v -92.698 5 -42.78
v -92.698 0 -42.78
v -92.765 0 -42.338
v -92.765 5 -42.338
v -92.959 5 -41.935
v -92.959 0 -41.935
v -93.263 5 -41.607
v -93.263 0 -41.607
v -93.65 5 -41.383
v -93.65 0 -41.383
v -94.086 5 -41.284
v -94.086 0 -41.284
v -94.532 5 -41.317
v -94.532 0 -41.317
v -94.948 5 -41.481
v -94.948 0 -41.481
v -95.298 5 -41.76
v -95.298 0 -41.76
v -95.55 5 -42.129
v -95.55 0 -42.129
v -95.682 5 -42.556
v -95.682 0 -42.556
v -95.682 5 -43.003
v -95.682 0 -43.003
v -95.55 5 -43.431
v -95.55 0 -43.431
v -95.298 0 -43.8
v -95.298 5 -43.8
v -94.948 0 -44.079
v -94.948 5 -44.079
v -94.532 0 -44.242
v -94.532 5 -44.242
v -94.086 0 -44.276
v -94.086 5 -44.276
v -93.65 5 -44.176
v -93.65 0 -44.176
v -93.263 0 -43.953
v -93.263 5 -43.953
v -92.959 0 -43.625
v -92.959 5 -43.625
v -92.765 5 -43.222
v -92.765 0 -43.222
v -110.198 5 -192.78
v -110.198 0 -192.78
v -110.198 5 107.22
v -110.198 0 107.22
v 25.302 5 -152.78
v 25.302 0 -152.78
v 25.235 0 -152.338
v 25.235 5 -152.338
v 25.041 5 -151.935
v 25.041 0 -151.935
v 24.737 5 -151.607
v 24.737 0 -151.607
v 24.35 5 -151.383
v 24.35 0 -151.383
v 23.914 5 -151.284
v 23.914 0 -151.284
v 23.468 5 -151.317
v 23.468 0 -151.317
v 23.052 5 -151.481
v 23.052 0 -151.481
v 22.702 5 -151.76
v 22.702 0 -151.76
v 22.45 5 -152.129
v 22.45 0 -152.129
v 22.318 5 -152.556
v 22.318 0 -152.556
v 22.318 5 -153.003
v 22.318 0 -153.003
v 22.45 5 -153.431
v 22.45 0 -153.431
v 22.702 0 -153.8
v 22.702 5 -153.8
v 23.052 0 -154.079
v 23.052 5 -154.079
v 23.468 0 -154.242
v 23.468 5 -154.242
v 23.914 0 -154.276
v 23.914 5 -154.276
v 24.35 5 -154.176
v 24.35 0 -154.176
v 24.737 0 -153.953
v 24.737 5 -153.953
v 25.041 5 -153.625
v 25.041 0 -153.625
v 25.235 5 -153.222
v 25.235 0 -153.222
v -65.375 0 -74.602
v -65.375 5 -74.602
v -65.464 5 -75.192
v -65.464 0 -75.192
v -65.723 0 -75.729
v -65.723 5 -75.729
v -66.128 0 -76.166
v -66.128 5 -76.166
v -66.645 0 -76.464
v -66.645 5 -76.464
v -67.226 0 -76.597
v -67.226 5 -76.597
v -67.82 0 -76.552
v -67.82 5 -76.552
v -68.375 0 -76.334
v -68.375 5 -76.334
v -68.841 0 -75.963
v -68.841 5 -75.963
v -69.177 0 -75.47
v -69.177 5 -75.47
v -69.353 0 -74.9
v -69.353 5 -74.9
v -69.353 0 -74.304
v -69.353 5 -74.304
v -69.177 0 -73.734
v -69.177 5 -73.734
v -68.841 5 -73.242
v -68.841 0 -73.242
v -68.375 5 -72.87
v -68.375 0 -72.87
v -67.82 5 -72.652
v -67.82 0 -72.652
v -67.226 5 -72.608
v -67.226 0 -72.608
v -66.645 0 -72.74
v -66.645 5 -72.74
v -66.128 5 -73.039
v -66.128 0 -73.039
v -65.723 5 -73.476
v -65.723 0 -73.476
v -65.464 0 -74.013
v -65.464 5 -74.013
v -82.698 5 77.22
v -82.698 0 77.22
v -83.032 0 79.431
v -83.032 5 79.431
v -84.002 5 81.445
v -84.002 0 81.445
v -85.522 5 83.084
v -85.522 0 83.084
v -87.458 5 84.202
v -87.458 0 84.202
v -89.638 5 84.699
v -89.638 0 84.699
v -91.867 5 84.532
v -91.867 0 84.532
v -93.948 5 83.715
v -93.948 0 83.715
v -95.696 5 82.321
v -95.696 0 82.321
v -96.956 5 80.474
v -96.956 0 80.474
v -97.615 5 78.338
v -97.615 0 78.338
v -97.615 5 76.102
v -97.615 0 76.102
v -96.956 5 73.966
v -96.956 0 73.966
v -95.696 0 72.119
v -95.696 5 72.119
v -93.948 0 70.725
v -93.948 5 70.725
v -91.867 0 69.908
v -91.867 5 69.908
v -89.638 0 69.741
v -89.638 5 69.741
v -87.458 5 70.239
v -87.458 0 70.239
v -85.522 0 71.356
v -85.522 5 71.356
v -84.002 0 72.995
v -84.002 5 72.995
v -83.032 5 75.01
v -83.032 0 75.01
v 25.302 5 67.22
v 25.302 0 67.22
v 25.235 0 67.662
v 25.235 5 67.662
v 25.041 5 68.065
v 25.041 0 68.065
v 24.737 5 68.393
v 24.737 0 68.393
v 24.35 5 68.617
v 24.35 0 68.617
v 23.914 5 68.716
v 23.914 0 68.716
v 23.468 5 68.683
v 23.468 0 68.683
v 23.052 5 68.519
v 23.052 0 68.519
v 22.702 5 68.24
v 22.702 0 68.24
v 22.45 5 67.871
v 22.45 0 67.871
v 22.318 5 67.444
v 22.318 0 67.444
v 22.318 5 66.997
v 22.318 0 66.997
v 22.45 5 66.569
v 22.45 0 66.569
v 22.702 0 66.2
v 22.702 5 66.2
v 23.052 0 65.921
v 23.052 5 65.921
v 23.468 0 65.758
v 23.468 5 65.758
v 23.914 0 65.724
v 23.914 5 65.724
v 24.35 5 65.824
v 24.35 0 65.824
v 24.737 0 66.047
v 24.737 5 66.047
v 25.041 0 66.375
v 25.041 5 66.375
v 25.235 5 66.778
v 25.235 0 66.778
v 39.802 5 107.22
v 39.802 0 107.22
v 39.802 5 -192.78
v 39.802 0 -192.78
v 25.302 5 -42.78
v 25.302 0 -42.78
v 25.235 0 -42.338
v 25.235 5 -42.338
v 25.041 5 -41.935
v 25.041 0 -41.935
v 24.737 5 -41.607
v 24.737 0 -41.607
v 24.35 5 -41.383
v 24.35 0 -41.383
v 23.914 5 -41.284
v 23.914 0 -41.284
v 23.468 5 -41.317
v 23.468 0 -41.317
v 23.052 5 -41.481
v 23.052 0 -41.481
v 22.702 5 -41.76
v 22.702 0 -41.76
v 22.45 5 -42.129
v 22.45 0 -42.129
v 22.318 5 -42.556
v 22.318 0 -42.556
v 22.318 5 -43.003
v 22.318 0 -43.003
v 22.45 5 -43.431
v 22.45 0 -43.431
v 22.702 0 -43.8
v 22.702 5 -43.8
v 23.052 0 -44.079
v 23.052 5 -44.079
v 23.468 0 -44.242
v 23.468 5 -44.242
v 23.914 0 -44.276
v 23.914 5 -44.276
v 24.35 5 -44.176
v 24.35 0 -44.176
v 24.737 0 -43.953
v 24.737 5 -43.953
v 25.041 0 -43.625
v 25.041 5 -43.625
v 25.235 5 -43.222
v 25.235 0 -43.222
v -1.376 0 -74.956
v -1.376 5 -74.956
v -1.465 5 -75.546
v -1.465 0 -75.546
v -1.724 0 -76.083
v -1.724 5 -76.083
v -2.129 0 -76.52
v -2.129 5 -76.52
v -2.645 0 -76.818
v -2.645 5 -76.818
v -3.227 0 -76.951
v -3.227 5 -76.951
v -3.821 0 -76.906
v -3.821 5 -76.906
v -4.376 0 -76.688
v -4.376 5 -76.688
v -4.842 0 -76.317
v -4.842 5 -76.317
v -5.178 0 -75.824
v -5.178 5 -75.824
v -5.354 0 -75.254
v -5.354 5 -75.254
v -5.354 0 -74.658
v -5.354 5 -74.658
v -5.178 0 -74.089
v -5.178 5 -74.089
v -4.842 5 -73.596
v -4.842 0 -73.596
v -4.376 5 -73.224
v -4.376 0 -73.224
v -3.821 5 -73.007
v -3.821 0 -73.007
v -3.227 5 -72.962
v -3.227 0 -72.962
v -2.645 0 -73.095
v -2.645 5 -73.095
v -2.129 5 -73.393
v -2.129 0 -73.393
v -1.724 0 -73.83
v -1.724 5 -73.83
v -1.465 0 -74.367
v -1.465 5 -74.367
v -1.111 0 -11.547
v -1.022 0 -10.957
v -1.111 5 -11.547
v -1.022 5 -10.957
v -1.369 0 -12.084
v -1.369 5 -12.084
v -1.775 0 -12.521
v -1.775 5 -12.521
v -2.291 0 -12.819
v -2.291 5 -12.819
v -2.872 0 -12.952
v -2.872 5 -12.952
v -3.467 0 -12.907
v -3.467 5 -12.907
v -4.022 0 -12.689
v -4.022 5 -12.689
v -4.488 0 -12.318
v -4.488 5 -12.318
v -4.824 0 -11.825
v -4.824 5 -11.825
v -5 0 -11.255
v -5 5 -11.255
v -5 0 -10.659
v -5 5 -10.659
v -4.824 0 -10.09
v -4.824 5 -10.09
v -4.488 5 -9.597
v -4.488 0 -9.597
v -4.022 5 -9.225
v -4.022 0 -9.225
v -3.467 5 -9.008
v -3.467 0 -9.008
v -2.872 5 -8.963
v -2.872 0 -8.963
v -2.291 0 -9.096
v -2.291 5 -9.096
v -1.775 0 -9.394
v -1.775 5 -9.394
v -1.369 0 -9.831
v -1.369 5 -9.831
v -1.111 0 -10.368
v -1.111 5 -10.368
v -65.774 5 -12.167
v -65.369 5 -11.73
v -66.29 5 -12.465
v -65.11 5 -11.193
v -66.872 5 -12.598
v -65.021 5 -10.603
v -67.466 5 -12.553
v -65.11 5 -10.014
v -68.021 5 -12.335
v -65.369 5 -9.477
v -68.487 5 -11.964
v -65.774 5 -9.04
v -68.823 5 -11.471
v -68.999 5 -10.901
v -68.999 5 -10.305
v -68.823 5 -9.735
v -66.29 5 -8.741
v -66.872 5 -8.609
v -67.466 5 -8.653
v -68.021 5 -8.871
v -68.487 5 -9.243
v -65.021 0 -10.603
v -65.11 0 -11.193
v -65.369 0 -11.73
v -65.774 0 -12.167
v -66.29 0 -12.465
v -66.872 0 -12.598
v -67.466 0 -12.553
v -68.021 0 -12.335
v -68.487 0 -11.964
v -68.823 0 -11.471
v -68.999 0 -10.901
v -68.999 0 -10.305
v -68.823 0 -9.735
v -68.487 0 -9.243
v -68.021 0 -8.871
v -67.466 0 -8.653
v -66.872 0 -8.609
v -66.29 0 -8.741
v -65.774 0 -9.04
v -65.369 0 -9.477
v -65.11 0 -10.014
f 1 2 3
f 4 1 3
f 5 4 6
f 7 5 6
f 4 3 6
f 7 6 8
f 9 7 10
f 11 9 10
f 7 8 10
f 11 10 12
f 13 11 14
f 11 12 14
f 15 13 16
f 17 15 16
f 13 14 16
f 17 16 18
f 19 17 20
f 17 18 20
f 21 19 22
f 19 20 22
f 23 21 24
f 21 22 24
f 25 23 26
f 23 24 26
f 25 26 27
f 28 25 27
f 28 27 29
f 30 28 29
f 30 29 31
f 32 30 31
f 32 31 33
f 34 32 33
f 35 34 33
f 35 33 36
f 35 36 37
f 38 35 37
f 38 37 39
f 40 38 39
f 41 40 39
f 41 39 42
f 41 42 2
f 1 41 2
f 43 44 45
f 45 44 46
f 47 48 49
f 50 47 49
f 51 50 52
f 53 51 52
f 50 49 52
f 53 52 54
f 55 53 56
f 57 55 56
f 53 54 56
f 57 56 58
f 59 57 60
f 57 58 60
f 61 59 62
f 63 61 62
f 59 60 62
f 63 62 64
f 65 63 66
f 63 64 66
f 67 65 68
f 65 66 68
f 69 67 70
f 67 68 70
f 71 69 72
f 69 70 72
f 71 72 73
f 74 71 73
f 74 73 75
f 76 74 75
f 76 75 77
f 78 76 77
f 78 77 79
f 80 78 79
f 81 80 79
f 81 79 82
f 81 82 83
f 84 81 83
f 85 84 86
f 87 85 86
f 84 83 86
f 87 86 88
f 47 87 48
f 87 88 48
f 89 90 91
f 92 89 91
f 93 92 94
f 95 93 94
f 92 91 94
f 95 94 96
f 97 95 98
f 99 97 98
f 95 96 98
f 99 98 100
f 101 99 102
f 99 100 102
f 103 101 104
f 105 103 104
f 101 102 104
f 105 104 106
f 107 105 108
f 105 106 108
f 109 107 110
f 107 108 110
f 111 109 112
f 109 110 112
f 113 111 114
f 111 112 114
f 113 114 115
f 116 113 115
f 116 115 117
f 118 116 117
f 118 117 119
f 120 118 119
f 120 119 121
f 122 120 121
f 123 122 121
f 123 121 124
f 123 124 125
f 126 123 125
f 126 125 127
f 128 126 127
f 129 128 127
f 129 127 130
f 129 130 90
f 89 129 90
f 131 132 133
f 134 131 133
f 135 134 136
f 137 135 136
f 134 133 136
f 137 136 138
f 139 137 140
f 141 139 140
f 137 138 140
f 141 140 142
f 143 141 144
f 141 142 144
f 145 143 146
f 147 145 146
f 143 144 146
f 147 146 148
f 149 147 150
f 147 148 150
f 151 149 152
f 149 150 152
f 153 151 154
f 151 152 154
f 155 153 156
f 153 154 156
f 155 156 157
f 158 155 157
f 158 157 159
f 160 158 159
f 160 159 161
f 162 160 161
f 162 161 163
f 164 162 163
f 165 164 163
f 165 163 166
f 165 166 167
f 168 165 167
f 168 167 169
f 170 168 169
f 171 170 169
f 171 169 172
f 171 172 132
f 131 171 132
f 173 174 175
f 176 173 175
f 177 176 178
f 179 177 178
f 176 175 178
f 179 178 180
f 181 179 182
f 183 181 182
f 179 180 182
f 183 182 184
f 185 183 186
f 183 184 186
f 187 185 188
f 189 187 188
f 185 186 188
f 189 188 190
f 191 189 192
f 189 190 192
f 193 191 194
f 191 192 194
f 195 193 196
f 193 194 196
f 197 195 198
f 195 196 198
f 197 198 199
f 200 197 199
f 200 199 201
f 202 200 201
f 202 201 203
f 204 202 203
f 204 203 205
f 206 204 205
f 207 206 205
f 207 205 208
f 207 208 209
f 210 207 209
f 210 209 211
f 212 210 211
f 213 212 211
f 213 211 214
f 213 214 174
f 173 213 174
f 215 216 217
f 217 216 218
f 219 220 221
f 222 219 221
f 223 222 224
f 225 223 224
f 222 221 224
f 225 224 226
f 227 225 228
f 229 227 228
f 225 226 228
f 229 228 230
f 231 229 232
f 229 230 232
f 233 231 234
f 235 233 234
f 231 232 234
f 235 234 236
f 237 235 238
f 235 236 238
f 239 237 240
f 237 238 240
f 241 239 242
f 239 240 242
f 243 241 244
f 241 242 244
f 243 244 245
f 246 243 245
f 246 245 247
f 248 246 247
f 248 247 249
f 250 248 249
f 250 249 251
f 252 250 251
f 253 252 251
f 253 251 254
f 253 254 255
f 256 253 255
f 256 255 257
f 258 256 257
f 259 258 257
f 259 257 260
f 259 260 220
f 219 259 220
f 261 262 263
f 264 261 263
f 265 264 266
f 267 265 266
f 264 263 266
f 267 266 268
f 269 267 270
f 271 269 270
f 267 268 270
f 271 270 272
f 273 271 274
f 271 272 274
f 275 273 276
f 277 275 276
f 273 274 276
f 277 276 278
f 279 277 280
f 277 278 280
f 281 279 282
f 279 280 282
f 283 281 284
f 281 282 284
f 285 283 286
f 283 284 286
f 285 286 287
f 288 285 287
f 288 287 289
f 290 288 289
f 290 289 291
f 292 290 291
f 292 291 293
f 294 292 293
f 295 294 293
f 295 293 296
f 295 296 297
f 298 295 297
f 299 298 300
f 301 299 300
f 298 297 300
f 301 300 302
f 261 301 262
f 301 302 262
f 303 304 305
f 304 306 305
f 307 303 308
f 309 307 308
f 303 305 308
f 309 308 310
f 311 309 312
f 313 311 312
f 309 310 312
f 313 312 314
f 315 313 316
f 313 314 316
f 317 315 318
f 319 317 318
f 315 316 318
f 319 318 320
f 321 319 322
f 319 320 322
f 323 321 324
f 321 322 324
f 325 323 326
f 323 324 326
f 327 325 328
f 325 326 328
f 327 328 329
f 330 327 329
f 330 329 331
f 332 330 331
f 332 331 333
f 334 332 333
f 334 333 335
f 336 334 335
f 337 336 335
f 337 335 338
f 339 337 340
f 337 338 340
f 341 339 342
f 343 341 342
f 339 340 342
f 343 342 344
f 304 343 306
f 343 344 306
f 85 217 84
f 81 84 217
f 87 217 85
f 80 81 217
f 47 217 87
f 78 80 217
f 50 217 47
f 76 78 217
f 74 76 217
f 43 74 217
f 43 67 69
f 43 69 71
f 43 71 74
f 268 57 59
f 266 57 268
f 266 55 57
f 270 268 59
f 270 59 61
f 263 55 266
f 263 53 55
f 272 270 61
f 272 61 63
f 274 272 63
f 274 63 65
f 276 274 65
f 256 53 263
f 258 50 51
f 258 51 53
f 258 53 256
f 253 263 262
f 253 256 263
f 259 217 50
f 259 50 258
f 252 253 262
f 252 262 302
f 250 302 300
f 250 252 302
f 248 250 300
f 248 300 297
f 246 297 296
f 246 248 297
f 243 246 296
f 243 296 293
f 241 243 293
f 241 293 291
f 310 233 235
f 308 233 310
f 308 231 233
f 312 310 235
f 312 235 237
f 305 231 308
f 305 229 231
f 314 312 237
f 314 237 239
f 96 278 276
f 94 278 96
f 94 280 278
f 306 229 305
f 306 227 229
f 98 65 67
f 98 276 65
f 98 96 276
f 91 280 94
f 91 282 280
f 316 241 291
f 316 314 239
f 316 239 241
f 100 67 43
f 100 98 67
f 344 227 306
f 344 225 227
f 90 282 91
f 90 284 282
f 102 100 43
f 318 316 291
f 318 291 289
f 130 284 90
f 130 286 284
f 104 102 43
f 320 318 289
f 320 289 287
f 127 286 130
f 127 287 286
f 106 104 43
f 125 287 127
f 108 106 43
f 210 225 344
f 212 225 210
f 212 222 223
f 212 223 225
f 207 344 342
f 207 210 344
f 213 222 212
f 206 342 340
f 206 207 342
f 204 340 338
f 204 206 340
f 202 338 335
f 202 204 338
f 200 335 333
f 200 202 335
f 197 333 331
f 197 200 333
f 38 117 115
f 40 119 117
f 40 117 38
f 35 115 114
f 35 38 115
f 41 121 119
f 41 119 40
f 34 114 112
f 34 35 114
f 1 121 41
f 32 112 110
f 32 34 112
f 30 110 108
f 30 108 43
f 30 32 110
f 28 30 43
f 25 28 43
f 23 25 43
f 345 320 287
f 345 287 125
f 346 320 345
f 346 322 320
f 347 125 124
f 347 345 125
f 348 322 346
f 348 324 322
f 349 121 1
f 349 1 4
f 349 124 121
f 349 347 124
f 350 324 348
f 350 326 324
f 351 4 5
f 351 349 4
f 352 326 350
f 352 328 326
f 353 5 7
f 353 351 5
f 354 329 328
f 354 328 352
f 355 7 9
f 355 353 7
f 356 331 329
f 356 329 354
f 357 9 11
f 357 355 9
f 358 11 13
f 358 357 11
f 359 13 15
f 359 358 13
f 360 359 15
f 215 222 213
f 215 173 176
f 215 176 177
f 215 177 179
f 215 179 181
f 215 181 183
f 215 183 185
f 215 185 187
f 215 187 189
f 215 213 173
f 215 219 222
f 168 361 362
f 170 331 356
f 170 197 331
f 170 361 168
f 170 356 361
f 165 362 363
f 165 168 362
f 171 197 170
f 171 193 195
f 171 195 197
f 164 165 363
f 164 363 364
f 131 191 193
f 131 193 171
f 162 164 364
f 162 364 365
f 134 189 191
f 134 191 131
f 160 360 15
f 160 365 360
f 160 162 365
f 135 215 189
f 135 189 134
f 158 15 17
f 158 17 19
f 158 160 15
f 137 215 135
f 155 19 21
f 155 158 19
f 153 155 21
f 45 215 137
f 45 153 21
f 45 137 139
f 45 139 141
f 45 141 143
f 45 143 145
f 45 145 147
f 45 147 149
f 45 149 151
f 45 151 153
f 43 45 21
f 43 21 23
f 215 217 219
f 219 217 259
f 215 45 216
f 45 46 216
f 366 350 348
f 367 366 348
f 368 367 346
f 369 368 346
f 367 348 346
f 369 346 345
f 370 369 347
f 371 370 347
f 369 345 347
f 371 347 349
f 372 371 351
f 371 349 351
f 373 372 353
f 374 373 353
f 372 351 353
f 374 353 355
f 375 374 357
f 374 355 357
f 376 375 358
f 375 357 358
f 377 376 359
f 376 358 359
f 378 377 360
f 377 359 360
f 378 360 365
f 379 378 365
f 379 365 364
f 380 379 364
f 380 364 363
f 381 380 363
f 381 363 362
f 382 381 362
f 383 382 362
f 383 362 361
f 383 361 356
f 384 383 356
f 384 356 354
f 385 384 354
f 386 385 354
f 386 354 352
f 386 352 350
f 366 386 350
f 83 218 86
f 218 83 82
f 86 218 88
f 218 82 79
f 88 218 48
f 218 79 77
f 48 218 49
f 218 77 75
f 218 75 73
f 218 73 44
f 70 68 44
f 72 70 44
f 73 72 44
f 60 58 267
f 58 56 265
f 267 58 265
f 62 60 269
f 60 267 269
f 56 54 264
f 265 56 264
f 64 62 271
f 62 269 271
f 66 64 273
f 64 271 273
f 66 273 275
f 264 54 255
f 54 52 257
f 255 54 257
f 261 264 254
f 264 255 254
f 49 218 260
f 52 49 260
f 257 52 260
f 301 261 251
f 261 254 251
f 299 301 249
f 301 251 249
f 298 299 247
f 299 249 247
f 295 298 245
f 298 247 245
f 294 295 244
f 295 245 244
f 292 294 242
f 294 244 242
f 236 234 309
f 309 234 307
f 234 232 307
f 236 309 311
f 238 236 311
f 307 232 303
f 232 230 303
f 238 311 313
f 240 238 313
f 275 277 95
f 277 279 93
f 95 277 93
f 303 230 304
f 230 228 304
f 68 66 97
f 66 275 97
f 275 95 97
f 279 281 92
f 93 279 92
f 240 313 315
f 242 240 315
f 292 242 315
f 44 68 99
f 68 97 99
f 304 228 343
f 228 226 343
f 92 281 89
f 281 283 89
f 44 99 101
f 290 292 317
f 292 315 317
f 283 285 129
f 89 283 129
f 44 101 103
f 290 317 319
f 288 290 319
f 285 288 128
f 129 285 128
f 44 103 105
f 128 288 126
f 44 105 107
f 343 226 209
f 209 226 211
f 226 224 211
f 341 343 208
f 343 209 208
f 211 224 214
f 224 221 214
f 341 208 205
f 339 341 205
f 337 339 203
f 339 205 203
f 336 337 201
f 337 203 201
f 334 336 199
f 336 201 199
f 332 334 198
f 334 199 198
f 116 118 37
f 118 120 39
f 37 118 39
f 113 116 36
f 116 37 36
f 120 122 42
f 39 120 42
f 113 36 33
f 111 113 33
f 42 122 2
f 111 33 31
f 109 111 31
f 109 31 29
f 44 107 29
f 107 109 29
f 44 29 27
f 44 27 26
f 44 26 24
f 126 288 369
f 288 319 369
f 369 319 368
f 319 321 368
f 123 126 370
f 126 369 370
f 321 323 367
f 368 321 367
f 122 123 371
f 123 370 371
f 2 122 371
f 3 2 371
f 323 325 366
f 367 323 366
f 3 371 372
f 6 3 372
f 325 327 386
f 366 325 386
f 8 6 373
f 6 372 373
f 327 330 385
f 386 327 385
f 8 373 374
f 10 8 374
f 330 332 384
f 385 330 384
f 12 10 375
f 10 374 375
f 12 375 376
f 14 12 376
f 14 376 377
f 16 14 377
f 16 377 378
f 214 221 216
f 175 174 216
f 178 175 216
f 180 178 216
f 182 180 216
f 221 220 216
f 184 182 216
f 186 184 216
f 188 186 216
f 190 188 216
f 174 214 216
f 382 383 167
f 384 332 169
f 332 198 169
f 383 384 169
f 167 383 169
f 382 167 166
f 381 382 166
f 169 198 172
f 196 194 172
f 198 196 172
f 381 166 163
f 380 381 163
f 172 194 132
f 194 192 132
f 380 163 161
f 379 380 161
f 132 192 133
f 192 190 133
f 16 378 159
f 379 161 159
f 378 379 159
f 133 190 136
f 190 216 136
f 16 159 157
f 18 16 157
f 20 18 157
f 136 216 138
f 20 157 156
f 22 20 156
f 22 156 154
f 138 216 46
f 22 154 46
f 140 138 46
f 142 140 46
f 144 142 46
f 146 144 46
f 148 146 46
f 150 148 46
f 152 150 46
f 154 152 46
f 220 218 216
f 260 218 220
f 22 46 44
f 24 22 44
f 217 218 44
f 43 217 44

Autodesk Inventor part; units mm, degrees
ref_plane "YZ Plane" through (0, 0, 0) normal (1, 0, 0) x (0, 1, 0)
ref_plane "XZ Plane" through (0, 0, 0) normal (0, 1, 0) x (-1, 0, 0)
ref_plane "XY Plane" through (0, 0, 0) normal (0, 0, 1) x (1, 0, 0)
sketch "Esquisse1" plane through (0, 0, 0) normal (0, 1, 0) x (-1, 0, 0)
  line L0 (110.1985, 107.2202) -> (-39.8015, 107.2202)
  line L1 (-39.8015, 107.2202) -> (-39.8015, -192.7798)
  line L2 (-39.8015, -192.7798) -> (110.1985, -192.7798)
  line L3 (110.1985, -192.7798) -> (110.1985, 107.2202)
  point P0 (0, 0)
  dimension "d0" = 300
  dimension "d1" = 150
extrude "Extrusion1" add sketch "Esquisse1" along normal blind 5
sketch "Esquisse2" plane through (0, 0, 0) normal (0, -1, 0) x (1, 0, 0)
  circle A0 centre (-94.1985, -42.7798) radius 1.5
  circle A1 centre (23.8015, -42.7798) radius 1.5
  circle A2 centre (23.8015, 67.2202) radius 1.5
  circle A3 centre (23.8015, -152.7798) radius 1.5
  line L0 (-110.1985, -192.7798) -> (-110.1985, 107.2202) projected
  line L1 (39.8015, -192.7798) -> (-110.1985, -192.7798) projected
  line L2 (39.8015, 107.2202) -> (39.8015, -192.7798) projected
  line L3 (-110.1985, 107.2202) -> (39.8015, 107.2202) projected
  point P0 (0, 0)
  dimension "d4" = 16
  dimension "d5" = 150
  dimension "d6" = 16
  dimension "d7" = 16
  dimension "d8" = 16
  dimension "d9" = 40
  dimension "d10" = 150
  dimension "d11" = 40
extrude "Extrusion2" cut sketch "Esquisse2" against normal through all contours A0 | A1 | A2 | A3
sketch "Esquisse6" plane through (0, 0, 0) normal (0, -1, 0) x (1, 0, 0)
  circle A0 centre (-90.1985, 77.2202) radius 7.5
  line L0 (-110.1985, 107.2202) -> (39.8015, 107.2202) projected
  line L1 (-110.1985, -192.7798) -> (-110.1985, 107.2202) projected
  point P0 (0, 0)
  dimension "d32" = 15
  dimension "d33" = 30
  dimension "d34" = 20
extrude "Extrusion6" cut sketch "Esquisse6" against normal up to next
sketch "Esquisse8" plane through (0, 5, 0) normal (0, 1, 0) x (1, 0, 0)
  circle A0 centre (-67.021, 10.6032) radius 2
  circle A1 centre (-3.0219, 10.9574) radius 2
  circle A2 centre (-3.3761, 74.9564) radius 2
  circle A3 centre (-67.3752, 74.6022) radius 2
  point P0 (0, 0)
extrude "Extrusion8" cut sketch "Esquisse8" against normal through all
properties part number "toit"
